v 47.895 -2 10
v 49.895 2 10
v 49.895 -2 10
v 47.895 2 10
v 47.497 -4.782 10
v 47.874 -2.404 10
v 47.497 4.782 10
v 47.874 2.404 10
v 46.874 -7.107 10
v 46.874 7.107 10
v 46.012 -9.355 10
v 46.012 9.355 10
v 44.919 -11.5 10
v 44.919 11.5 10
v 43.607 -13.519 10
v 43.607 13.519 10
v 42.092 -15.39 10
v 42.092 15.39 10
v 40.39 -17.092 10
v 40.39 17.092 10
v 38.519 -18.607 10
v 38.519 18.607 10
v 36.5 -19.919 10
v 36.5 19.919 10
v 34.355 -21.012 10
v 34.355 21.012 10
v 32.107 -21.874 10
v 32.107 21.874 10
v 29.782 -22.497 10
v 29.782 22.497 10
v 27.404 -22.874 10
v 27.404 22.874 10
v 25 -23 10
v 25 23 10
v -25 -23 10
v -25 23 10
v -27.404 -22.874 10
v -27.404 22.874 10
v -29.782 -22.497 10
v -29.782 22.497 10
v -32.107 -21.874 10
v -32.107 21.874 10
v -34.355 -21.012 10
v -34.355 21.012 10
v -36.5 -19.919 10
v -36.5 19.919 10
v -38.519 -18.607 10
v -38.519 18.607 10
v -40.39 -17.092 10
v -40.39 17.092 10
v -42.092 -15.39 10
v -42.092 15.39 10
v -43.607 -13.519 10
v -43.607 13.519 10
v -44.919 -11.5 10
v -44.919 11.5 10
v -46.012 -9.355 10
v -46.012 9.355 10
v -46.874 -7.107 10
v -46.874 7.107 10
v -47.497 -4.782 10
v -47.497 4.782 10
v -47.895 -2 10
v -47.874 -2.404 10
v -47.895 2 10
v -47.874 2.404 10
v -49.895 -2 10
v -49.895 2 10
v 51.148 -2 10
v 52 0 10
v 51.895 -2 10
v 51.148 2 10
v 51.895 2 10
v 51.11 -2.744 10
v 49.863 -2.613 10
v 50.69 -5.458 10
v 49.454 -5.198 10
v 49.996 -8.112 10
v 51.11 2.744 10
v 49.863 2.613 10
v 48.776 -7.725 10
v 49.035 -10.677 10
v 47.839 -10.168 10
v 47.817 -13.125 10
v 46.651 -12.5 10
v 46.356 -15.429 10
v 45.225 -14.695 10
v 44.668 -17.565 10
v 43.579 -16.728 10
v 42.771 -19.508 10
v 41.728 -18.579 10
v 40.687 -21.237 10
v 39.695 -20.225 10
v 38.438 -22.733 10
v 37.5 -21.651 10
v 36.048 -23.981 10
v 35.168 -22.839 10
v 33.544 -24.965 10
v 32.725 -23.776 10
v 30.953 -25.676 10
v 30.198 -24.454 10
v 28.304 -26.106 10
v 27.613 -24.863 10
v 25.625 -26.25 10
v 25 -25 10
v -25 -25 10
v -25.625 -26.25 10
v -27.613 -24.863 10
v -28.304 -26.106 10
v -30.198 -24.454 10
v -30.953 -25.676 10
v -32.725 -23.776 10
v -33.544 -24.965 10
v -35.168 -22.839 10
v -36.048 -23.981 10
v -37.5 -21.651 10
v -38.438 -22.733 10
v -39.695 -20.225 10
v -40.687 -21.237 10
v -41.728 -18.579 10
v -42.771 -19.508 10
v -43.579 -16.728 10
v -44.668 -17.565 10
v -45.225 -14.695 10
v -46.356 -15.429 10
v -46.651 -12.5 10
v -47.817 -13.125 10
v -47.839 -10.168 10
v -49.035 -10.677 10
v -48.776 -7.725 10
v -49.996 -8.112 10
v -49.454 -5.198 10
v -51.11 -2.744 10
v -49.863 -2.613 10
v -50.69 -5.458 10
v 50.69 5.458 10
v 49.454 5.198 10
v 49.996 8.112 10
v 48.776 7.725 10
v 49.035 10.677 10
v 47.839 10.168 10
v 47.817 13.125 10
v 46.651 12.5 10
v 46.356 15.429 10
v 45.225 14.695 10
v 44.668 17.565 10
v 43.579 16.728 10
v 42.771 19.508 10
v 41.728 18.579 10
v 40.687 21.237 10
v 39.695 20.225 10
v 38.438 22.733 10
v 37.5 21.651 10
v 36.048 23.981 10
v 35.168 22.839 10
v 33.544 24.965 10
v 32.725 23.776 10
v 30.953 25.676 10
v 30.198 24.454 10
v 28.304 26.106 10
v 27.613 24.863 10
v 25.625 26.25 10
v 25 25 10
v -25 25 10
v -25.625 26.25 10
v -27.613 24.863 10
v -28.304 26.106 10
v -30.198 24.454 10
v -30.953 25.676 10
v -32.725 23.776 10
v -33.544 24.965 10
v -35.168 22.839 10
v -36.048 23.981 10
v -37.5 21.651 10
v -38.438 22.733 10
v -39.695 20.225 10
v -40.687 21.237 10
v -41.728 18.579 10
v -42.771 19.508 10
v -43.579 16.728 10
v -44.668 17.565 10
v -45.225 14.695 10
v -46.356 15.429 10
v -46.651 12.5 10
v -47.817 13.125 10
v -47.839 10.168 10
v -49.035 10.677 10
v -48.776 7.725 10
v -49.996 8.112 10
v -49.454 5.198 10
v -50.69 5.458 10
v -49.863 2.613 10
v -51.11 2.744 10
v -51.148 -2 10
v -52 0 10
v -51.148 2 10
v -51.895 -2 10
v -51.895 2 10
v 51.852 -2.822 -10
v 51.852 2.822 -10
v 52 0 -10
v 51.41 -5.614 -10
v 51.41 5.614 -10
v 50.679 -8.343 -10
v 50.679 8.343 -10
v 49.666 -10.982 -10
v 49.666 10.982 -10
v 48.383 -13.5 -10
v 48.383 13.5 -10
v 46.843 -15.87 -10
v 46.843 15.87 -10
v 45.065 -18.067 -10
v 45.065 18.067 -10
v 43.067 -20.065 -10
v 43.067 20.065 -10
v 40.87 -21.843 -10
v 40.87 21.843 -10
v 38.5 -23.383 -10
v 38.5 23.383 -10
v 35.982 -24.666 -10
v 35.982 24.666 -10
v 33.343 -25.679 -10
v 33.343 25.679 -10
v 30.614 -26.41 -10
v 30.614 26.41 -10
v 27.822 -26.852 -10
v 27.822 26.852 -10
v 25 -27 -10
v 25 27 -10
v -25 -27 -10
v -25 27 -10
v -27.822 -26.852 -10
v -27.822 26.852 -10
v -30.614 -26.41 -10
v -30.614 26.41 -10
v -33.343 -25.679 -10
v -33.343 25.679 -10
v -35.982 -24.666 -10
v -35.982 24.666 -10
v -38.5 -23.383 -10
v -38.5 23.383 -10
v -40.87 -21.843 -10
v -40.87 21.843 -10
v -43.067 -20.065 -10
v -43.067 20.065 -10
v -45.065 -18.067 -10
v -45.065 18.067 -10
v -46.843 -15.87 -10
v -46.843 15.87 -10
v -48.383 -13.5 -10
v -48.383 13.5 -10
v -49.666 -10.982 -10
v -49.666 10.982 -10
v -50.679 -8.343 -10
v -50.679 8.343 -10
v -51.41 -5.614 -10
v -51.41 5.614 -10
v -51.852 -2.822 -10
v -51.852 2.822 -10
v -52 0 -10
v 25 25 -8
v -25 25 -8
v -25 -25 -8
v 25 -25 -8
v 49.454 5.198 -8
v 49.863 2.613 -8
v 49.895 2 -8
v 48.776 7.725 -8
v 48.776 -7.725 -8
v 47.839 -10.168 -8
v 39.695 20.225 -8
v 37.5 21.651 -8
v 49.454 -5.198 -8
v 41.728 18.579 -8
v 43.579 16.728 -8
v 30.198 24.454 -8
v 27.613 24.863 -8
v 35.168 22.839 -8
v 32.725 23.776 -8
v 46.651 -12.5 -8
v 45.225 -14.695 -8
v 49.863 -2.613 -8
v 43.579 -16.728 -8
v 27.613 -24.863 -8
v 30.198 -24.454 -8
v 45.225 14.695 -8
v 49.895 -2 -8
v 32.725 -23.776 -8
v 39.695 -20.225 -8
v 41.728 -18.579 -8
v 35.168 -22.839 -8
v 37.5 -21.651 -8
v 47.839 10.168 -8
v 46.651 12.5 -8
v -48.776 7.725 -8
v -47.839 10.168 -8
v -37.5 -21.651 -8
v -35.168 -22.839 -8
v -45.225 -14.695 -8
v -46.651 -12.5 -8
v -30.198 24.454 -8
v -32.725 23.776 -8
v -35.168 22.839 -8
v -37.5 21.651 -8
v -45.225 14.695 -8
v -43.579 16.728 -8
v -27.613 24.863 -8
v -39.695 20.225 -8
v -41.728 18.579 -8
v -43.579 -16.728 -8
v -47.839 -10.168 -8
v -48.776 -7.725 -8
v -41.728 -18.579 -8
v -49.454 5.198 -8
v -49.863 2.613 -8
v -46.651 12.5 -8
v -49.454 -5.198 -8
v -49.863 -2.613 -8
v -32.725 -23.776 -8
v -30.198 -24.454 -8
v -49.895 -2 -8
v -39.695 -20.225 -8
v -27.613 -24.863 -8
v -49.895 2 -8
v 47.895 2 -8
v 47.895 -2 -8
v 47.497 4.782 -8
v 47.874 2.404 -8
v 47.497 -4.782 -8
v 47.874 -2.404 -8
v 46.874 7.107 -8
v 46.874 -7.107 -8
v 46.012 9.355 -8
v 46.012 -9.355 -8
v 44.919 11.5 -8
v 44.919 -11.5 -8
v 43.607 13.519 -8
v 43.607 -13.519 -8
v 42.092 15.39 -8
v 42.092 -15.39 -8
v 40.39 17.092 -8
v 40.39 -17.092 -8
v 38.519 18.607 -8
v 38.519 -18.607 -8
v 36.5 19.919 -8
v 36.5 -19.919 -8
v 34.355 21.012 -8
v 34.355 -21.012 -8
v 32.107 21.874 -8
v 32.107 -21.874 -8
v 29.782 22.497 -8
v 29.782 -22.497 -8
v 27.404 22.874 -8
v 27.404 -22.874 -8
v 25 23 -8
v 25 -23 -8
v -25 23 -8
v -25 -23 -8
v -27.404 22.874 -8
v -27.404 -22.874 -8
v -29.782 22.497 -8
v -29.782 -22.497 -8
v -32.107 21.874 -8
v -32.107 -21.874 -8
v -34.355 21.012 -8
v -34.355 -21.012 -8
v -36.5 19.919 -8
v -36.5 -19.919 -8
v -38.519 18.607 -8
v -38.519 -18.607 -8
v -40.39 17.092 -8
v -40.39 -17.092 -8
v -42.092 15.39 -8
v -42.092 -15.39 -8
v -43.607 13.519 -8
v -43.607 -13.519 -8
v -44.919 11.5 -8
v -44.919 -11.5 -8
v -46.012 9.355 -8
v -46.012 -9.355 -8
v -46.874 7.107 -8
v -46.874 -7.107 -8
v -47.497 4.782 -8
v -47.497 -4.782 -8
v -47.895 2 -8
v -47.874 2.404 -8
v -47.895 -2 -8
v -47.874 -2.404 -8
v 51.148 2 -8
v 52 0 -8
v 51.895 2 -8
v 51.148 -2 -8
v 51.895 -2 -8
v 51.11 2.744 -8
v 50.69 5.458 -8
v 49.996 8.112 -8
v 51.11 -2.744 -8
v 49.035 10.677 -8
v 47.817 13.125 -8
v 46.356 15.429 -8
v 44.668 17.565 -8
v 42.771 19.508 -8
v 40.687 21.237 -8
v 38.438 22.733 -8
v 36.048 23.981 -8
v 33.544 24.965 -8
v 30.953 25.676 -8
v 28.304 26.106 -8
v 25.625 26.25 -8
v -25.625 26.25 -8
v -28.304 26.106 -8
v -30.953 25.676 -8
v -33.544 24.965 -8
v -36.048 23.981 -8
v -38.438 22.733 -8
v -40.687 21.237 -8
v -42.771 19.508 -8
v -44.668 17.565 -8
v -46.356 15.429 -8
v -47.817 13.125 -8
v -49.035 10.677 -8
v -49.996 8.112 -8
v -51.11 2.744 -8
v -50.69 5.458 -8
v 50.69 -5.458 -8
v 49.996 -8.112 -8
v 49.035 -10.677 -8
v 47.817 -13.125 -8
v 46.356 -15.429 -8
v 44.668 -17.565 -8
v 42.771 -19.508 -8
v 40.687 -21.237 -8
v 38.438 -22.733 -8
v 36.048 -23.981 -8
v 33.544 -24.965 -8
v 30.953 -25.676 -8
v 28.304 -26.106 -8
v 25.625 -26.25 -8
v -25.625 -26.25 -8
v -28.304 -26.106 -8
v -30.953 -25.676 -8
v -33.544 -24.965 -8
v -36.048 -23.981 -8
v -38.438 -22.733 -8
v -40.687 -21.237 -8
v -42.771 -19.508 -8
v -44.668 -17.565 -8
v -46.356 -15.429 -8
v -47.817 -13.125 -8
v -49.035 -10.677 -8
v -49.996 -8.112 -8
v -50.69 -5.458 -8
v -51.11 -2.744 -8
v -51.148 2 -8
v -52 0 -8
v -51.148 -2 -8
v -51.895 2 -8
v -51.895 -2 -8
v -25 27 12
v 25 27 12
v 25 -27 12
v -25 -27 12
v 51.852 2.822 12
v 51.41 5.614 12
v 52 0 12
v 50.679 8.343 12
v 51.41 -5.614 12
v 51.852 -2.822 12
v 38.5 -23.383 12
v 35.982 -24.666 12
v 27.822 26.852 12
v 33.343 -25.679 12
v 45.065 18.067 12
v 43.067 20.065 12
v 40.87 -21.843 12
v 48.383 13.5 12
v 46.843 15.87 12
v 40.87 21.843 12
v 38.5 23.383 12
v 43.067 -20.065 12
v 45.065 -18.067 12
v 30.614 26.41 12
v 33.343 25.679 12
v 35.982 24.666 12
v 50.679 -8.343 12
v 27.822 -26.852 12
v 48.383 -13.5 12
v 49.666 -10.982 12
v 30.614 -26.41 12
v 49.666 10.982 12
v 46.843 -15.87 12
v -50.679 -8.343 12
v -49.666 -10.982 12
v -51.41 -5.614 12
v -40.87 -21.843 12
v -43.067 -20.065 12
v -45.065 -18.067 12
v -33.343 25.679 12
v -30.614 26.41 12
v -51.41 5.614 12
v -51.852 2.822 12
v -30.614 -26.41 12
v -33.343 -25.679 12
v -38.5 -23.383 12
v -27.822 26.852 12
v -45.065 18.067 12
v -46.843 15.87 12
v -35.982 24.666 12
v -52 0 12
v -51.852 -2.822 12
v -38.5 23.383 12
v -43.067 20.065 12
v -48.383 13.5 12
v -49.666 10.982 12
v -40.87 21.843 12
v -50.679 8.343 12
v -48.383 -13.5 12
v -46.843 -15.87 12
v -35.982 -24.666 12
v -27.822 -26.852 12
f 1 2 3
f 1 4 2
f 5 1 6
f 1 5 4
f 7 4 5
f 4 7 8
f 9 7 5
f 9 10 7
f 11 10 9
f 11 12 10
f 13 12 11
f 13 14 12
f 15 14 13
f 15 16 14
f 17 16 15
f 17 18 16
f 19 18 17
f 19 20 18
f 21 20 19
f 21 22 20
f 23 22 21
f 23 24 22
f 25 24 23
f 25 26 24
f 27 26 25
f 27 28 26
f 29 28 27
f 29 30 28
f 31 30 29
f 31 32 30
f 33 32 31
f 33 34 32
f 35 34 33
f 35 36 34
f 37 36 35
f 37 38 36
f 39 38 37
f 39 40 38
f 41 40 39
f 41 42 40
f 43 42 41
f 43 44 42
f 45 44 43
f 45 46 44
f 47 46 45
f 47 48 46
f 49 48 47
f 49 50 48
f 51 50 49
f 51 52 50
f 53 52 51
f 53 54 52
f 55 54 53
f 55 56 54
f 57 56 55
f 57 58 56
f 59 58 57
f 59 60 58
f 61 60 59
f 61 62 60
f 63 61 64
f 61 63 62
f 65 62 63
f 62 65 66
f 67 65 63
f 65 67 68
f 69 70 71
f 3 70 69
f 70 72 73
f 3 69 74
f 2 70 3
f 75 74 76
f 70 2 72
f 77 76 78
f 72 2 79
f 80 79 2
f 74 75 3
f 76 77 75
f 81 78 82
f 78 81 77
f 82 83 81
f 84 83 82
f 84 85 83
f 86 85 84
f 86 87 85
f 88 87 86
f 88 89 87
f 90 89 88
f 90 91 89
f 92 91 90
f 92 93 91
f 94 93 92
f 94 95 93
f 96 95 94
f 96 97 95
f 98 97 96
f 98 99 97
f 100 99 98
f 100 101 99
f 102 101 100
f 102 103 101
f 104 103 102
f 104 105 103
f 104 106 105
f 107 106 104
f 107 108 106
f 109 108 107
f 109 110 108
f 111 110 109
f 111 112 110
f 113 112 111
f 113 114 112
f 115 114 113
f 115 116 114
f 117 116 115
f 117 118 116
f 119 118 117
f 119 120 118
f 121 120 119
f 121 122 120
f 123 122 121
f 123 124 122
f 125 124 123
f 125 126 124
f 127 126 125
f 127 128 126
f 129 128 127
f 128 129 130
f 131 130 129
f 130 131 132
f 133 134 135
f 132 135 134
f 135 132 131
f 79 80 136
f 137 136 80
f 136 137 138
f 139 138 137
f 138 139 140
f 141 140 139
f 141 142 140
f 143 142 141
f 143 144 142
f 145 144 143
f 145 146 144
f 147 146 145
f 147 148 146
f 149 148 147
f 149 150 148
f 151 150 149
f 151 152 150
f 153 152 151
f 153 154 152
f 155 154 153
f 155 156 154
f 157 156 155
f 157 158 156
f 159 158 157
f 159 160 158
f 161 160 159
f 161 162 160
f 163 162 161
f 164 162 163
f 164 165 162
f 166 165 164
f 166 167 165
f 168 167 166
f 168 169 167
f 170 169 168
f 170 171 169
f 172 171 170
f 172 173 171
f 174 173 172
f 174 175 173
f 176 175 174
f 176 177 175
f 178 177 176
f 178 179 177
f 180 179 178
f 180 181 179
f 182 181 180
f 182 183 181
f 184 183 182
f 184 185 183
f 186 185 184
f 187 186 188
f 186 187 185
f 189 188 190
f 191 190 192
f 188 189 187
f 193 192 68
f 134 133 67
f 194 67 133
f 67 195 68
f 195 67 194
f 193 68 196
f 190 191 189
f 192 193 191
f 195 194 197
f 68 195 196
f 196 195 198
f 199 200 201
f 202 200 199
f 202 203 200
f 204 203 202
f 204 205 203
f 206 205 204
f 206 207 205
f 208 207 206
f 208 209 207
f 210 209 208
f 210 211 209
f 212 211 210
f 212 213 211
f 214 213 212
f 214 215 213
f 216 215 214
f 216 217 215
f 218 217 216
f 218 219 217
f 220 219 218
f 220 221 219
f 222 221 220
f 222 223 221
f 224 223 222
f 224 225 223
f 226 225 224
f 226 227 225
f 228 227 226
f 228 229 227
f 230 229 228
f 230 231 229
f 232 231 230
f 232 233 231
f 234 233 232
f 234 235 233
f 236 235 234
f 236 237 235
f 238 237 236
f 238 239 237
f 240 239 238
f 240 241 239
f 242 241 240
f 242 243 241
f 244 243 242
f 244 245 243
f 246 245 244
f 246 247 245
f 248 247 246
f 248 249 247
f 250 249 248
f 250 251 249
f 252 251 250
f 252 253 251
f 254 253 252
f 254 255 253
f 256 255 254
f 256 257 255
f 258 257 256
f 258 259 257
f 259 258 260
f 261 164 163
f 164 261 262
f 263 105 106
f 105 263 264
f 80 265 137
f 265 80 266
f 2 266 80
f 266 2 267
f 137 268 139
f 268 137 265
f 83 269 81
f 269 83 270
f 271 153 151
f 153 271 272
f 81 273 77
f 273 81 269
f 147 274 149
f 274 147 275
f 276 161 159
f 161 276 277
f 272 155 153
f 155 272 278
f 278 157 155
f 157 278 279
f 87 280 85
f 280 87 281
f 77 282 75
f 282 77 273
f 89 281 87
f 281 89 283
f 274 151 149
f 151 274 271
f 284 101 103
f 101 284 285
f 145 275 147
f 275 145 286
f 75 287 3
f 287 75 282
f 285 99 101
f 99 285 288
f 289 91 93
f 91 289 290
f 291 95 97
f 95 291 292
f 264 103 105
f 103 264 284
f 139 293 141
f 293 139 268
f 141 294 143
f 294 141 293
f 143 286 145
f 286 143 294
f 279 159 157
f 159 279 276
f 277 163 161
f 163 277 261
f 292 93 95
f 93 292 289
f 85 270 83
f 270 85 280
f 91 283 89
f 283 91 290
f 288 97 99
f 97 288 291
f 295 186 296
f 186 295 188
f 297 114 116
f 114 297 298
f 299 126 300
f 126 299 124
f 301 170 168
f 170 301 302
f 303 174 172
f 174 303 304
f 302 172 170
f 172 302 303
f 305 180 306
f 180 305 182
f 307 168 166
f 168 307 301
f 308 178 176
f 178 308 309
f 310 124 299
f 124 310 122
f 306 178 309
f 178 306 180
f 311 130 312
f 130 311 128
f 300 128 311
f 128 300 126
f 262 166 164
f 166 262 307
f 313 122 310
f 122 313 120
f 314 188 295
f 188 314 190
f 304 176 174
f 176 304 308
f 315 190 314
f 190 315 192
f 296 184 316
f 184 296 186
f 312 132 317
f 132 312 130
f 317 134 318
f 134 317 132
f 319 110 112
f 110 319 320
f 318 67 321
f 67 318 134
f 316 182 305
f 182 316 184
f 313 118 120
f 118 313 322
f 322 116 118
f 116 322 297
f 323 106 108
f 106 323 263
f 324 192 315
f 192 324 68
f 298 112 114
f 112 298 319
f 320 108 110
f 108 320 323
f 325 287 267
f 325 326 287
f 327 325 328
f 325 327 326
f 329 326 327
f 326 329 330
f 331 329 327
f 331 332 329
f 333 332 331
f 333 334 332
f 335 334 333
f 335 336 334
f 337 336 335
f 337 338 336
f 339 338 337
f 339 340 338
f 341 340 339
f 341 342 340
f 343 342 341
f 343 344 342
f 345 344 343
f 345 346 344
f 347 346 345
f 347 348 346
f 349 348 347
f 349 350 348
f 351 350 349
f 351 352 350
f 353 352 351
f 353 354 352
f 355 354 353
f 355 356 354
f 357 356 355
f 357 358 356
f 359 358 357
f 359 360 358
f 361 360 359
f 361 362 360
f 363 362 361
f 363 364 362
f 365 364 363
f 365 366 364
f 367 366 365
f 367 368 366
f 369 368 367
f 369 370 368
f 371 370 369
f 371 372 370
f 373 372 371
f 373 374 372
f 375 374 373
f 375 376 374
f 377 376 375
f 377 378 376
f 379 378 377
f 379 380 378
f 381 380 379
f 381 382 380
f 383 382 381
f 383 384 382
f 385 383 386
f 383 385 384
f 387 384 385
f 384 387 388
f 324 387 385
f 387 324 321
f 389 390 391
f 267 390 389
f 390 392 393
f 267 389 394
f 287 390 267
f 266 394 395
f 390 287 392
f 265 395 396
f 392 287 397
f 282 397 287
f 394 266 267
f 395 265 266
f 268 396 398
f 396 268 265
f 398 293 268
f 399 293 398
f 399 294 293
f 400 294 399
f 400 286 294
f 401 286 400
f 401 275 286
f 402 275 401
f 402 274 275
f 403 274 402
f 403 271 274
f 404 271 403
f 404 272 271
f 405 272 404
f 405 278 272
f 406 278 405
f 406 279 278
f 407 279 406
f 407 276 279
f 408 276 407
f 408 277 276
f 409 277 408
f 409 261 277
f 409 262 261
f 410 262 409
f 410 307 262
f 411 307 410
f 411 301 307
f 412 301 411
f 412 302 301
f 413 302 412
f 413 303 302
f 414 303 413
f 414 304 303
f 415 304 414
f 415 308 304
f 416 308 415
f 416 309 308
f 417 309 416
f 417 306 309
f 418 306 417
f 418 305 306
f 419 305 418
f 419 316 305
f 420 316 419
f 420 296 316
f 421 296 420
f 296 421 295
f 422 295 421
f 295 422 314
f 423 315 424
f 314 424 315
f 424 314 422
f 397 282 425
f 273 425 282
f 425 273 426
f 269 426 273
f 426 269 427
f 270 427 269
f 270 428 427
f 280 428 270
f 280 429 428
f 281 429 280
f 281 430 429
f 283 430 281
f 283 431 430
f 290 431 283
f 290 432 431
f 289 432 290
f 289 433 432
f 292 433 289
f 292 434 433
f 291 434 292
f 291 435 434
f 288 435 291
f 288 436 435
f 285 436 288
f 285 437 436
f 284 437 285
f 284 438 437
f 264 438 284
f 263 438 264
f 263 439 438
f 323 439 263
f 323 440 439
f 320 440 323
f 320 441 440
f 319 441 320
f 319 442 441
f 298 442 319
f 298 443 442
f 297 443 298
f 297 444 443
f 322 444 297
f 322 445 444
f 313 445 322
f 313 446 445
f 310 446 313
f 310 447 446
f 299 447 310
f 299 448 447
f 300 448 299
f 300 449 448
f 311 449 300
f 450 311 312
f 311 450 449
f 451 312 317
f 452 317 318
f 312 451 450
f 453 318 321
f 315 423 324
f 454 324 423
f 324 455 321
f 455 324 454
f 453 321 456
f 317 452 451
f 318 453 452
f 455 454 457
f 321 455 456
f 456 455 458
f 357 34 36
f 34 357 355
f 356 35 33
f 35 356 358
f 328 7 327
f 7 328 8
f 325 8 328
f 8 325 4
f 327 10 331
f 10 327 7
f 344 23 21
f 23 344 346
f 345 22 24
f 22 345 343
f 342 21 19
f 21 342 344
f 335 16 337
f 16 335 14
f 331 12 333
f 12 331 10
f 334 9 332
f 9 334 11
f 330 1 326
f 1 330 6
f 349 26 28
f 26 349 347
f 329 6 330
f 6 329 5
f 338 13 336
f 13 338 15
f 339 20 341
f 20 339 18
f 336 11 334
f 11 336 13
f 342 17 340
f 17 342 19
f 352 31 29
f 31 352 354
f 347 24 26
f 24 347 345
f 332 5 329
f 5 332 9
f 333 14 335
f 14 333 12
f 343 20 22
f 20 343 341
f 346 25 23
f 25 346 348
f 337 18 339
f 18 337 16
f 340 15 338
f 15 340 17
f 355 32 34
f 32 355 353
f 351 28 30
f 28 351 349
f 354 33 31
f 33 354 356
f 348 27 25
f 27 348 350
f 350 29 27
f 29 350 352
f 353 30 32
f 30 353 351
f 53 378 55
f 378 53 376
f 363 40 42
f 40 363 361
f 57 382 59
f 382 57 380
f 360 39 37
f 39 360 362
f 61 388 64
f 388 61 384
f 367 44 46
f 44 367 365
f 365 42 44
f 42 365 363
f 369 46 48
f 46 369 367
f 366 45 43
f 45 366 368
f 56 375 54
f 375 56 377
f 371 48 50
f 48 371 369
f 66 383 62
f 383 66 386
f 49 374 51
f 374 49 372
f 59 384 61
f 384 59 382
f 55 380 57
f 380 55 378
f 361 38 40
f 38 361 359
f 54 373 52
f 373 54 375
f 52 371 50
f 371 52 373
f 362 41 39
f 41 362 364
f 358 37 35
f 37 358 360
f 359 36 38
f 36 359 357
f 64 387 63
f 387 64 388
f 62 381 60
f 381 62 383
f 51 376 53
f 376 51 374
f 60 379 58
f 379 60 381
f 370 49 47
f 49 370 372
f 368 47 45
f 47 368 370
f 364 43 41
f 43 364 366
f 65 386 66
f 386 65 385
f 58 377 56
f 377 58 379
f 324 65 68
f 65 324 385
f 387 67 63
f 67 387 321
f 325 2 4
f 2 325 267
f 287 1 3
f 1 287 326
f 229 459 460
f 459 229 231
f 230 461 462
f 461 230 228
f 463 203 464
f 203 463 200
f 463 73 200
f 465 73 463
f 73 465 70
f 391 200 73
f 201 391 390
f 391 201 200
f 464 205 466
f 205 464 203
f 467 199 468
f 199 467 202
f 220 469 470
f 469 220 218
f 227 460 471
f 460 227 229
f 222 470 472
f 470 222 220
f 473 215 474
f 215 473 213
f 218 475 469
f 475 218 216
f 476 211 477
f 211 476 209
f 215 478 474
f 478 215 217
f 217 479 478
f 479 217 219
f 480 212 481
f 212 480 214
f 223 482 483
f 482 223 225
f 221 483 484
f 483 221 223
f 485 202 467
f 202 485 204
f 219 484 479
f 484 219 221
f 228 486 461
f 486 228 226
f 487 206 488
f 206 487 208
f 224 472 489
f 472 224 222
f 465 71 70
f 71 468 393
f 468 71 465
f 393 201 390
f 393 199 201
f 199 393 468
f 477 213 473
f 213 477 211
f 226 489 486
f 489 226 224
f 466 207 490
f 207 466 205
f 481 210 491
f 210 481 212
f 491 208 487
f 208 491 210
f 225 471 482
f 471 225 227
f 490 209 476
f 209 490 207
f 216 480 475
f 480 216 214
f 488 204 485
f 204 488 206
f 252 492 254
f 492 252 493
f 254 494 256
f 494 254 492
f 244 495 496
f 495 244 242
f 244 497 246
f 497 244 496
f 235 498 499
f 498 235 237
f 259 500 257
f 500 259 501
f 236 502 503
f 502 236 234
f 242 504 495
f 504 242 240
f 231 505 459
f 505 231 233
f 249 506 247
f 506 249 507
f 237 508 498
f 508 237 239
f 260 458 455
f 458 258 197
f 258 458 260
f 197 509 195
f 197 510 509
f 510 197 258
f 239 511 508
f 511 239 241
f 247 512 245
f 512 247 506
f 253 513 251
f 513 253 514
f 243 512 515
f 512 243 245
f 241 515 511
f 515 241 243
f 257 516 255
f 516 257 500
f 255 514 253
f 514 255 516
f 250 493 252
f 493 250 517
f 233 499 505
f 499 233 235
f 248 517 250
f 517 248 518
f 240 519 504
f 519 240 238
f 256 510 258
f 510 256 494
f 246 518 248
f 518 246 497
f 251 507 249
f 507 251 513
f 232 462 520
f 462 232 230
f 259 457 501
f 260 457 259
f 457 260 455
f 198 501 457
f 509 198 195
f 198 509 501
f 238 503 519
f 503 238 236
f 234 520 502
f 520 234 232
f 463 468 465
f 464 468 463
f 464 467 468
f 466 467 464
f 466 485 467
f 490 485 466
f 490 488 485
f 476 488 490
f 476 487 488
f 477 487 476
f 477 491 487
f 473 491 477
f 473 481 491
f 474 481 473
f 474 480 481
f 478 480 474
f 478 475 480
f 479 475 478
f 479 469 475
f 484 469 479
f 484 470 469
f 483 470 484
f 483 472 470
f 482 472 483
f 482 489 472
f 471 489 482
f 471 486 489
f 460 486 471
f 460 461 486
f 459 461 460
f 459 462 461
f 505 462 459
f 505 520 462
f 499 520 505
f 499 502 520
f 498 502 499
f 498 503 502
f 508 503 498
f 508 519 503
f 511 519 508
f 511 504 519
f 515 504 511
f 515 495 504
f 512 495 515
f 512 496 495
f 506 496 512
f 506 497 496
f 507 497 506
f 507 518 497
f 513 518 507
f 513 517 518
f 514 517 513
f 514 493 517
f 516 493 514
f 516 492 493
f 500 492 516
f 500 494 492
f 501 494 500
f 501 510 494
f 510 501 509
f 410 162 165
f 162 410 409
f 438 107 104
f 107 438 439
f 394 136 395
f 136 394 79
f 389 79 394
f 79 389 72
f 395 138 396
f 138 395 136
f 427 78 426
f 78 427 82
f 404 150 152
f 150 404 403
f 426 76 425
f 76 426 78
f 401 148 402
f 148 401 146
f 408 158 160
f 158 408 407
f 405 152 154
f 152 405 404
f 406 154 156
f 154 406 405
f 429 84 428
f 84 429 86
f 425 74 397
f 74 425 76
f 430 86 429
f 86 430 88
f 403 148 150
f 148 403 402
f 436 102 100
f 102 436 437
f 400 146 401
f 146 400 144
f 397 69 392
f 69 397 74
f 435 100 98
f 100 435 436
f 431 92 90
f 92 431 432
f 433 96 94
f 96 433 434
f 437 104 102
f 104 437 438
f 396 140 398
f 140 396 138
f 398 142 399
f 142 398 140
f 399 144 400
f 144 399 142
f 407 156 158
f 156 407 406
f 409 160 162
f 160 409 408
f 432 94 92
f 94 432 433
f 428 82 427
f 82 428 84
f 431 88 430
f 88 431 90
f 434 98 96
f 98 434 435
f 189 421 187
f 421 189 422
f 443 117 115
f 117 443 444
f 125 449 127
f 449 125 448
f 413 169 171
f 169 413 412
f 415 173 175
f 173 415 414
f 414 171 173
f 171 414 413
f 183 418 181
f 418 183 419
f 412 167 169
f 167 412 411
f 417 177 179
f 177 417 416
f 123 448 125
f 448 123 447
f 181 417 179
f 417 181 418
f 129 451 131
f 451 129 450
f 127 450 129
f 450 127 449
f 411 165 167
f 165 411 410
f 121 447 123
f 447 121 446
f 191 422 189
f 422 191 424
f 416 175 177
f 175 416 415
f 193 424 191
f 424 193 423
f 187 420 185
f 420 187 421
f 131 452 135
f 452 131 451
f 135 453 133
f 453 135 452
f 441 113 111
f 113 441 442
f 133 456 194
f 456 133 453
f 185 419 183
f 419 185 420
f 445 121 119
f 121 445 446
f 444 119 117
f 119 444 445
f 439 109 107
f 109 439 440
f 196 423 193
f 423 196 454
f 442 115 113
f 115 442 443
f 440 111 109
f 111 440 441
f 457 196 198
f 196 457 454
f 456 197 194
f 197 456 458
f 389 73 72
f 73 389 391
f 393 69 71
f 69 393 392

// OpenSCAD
// CableBox


box = true;
cover = true;
boden = true;

xx = 50;
yy = xx;
zz = 20;
ww = 2;

sx = (xx-ww)/xx;
sy = (yy-2*ww)/yy;
tolleranz = 5;

module oval()
{
    cube([xx,yy,zz], center= true);
    translate([xx/2,0,0])
    cylinder(d=xx, h=zz, center=true);
    translate([-xx/2,0,0])
    cylinder(d=xx, h=zz, center=true);
}

module oval_innen()
{
    cube([xx,yy-2*ww,zz], center= true);
    translate([xx/2,0,0])
    cylinder(d=xx-2*ww, h=zz, center=true);
    translate([-xx/2,0,0])
    cylinder(d=xx-2*ww, h=zz, center=true);
}

module oval_aussen()
{
    cube([xx,yy+2*ww,zz], center= true);
    translate([xx/2,0,0])
    cylinder(d=xx+2*ww, h=zz, center=true);
    translate([-xx/2,0,0])
    cylinder(d=xx+2*ww, h=zz, center=true);
}

module oval_boden()
{
    cube([xx,yy+2*ww,ww], center= true);
    translate([xx/2,0,0])
    cylinder(d=xx+2*ww, h=ww, center=true);
    translate([-xx/2,0,0])
    cylinder(d=xx+2*ww, h=ww, center=true);
}


module dose()
{

    difference() {
        oval();
        translate([0,0,ww])
        oval_innen();
        translate([-xx+ww/2,0,ww])
        kerbe();
        translate([xx-ww/2,0,ww])
        kerbe();
   }
   if (boden) translate([0,0,-zz/2+ww/2])
   oval_boden();
}

module deckel()
{

   translate([0,0,ww])
   difference() {
        oval_aussen();
        scale([1+schlupf/2,1.+schlupf,1])
        translate([0,0,-ww])
        oval();
        translate([-xx,0,-ww])
        kerbe();
        translate([xx,0,-ww])
        kerbe();

    }
}

module kerbe()
{

    cube([ww+2,ww+2,zz],center=true);
}

// ============================================
$fn = 60;
schlupf = tolleranz / 100;
if (box)   dose();
if (cover) deckel();
// ============================================
